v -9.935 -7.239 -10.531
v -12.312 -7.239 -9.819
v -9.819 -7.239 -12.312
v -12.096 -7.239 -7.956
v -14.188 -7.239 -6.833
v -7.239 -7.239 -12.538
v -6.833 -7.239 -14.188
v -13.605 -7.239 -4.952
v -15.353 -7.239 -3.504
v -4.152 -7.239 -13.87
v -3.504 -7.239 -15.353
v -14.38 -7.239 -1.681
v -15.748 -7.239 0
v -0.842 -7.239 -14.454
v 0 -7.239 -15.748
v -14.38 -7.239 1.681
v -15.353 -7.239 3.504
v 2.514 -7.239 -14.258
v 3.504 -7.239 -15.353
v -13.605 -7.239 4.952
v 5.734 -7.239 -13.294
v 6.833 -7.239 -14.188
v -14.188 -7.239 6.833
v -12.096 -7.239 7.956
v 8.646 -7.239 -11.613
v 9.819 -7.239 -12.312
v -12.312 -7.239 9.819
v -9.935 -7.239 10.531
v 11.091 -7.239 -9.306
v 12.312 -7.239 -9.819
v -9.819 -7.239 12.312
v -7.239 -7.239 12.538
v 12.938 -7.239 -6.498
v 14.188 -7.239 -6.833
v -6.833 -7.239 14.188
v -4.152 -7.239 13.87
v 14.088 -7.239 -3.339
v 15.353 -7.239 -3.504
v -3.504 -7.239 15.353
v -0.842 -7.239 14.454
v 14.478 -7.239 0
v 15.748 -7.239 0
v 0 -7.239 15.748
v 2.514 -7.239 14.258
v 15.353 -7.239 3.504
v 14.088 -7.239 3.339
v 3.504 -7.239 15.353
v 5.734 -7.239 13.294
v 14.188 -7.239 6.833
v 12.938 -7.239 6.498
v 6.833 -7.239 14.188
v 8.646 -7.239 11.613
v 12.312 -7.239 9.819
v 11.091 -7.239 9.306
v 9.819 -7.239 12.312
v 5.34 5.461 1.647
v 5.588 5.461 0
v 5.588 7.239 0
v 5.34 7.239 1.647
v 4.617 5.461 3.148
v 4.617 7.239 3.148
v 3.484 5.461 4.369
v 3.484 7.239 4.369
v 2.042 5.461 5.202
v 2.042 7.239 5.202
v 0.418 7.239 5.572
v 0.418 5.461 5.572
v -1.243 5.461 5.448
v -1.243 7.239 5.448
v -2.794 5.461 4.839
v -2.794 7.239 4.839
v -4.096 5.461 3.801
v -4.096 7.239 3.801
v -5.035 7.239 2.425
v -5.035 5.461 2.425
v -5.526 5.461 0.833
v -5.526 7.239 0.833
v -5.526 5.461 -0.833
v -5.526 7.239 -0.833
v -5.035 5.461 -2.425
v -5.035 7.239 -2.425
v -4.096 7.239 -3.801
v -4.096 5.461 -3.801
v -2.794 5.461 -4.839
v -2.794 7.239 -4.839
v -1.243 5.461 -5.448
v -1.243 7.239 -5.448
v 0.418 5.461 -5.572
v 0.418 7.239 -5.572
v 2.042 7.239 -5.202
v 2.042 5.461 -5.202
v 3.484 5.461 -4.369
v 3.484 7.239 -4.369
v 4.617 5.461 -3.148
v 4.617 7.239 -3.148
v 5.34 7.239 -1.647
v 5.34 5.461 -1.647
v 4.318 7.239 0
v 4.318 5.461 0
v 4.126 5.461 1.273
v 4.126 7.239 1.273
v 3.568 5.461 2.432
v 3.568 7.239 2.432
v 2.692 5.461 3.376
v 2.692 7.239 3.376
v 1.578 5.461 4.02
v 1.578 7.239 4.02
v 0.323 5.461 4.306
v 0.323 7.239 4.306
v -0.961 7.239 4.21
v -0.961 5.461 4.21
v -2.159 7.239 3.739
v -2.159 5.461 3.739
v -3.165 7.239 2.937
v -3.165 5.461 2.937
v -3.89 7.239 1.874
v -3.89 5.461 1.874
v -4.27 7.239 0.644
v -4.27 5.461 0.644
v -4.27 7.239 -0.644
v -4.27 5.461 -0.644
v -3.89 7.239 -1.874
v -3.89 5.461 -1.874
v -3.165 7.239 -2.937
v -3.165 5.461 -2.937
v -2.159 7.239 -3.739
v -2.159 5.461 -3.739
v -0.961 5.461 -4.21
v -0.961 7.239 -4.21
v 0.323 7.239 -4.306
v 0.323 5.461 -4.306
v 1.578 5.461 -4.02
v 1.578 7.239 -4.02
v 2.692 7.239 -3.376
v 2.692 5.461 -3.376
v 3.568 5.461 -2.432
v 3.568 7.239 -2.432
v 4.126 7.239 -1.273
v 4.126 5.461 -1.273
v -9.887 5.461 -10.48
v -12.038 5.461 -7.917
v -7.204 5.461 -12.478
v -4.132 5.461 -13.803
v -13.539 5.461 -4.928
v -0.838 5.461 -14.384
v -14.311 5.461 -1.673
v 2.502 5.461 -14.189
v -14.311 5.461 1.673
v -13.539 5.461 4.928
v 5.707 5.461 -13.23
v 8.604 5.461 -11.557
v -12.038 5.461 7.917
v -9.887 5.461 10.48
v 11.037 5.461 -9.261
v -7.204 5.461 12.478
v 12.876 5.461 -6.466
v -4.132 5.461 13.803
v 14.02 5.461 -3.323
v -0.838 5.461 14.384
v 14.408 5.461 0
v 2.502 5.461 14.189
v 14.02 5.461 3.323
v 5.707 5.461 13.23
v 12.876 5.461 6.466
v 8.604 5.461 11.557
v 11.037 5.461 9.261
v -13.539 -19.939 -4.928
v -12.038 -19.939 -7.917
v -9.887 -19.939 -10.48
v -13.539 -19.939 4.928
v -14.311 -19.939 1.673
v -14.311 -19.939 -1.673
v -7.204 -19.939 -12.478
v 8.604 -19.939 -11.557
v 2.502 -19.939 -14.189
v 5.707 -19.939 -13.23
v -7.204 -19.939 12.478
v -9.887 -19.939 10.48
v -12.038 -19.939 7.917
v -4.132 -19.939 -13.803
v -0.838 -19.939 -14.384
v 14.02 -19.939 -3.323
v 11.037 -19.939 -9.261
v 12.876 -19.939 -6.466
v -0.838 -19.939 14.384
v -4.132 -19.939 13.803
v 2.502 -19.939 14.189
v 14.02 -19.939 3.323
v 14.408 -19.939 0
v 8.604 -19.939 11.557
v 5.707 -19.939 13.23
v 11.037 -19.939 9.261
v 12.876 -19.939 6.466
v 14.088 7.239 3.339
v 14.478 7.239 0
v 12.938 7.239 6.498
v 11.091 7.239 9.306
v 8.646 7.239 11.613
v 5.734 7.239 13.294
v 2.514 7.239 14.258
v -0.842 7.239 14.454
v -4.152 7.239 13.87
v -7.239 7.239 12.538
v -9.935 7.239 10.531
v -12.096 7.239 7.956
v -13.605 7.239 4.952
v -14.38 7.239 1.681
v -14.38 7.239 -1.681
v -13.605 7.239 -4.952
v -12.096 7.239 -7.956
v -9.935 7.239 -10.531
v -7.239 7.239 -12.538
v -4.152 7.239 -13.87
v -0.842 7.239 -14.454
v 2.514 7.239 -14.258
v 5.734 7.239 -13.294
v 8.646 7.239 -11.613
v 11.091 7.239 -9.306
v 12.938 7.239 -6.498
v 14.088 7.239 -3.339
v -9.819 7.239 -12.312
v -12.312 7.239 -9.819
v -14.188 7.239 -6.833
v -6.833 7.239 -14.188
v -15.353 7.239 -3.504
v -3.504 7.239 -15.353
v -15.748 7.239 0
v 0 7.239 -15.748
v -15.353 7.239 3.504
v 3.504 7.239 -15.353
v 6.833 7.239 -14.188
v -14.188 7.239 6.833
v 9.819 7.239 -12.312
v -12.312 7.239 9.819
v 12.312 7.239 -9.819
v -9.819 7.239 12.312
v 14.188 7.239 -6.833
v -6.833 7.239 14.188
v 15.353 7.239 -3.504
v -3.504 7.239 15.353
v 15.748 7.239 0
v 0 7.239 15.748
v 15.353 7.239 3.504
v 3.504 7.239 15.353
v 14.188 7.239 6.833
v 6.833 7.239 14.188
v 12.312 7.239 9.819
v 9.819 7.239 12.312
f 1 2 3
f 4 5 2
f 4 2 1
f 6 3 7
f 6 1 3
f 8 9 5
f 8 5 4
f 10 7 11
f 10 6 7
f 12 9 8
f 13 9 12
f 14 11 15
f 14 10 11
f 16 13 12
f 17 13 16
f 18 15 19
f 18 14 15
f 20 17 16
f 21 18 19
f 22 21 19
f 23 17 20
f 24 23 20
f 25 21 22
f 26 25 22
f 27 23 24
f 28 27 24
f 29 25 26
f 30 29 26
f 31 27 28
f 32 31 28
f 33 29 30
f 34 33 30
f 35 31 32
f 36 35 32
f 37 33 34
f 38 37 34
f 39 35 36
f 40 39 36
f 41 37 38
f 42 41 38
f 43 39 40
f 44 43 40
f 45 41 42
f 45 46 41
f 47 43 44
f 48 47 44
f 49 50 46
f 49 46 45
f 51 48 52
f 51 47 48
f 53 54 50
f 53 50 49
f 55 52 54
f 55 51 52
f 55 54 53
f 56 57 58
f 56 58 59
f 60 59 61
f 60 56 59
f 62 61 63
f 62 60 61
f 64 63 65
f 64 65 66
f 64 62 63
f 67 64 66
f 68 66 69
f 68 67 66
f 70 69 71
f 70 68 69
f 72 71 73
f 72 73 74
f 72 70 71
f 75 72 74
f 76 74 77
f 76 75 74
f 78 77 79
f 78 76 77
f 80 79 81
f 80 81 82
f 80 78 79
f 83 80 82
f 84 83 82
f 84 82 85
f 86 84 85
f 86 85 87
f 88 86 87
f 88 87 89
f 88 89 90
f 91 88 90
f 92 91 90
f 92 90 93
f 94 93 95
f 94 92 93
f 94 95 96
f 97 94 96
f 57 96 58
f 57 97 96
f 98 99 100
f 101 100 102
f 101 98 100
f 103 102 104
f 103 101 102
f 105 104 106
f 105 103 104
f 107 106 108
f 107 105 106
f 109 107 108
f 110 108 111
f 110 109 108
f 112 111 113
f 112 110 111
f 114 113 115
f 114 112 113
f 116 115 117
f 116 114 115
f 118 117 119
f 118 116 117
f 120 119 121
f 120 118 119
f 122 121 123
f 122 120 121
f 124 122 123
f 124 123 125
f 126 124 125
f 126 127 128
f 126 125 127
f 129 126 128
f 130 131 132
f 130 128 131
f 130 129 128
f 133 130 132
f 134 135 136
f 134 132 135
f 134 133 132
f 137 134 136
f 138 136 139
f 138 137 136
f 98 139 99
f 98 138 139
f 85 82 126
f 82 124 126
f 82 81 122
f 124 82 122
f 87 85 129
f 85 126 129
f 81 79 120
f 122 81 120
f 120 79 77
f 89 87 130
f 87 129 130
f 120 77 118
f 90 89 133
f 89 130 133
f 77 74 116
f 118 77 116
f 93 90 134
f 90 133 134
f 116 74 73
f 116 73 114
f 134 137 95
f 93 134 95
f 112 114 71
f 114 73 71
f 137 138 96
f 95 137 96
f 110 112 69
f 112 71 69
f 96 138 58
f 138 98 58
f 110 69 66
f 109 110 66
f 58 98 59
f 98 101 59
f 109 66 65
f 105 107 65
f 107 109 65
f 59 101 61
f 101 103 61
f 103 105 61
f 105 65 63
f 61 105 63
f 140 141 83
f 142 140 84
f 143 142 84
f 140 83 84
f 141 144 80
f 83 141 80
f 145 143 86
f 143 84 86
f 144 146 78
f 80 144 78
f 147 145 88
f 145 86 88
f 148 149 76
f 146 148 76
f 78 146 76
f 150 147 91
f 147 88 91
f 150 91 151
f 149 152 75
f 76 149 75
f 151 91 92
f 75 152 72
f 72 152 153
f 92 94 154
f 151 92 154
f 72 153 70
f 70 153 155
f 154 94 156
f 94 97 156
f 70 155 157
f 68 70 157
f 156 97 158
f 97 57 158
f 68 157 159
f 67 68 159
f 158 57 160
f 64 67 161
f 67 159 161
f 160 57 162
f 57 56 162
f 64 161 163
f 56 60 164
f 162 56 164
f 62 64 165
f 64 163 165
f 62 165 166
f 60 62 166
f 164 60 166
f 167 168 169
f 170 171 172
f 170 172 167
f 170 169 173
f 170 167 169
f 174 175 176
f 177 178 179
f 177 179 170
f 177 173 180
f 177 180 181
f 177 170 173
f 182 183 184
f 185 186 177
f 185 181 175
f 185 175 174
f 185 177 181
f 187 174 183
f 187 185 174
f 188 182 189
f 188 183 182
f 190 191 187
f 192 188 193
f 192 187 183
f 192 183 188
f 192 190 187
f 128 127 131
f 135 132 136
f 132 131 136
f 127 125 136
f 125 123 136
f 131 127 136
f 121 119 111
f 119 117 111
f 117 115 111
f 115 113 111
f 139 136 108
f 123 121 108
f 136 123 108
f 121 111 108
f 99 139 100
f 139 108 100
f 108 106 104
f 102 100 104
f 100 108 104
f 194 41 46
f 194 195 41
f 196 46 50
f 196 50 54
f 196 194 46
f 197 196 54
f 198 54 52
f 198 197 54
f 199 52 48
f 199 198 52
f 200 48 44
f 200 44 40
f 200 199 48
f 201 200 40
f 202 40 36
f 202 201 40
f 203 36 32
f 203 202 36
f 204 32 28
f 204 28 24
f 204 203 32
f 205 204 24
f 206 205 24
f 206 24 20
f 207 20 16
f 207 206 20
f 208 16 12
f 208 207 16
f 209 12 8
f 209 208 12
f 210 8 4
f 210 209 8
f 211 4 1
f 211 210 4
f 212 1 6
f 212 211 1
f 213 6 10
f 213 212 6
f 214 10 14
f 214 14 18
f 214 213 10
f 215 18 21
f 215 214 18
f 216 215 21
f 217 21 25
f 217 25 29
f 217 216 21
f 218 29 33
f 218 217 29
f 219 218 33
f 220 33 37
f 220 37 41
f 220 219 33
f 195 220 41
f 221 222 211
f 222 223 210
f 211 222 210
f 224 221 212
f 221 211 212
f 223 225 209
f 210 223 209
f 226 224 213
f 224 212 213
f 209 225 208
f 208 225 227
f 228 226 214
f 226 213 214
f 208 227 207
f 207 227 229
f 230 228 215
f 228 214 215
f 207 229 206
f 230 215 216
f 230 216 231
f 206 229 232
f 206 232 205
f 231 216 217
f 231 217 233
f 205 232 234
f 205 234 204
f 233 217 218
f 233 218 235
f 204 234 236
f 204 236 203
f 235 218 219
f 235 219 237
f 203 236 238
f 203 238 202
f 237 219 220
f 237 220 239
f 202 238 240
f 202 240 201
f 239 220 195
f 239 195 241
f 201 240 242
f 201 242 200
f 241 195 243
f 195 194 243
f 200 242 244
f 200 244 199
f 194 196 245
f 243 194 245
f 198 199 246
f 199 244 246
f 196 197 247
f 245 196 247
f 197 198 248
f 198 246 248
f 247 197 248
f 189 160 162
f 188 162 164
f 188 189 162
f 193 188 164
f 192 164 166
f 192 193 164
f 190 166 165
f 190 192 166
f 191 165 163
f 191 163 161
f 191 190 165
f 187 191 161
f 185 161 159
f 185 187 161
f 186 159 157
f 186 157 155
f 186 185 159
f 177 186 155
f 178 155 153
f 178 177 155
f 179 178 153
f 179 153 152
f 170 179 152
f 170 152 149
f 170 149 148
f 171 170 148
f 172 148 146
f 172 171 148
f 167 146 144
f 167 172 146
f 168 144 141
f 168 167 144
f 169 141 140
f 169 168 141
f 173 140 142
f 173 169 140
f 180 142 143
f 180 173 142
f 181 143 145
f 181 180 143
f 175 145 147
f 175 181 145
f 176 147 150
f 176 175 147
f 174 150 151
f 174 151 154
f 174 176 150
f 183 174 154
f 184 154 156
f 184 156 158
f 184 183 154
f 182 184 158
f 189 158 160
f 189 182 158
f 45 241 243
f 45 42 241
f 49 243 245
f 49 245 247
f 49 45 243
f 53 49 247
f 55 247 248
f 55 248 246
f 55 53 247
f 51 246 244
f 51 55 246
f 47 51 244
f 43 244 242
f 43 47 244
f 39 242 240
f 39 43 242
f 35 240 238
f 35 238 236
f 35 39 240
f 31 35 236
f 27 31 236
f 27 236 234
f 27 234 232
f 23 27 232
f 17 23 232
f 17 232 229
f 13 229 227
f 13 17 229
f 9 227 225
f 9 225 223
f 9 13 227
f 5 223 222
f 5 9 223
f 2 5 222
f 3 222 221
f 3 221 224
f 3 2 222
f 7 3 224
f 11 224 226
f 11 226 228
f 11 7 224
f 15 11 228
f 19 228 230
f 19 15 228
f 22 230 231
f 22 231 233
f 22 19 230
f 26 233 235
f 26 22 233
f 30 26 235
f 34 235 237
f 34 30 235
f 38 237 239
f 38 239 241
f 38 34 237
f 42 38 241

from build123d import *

# Parameters (mm, degrees)
F0_R     = 5.588
F0_R_2   = 4.318
F1_DEPTH = 7.239
F0_R_3   = 15.748
F0_R_4   = 14.478
F2_R     = 14.40807173
F3_DEPTH = 12.7


with BuildPart() as f1:
    # F0 (on Front) → F1 (new body, symmetric)
    with BuildSketch(Plane.XZ):
        Circle(F0_R)
        Circle(F0_R_2, mode=Mode.SUBTRACT)
    extrude(amount=F1_DEPTH, both=True)

    # F2 (on face) → F3 (join, symmetric)
    with BuildSketch(Plane.XZ.offset(7.239)):
        Circle(F2_R)
    extrude(amount=F3_DEPTH, both=True)


with BuildPart() as f1b:
    # F0 (on Front) → F1, piece 2 (new body, symmetric)
    with BuildSketch(Plane.XZ):
        Circle(F0_R_3)
        Circle(F0_R_4, mode=Mode.SUBTRACT)
    extrude(amount=F1_DEPTH, both=True)


solid = Compound([f1.part, f1b.part])
